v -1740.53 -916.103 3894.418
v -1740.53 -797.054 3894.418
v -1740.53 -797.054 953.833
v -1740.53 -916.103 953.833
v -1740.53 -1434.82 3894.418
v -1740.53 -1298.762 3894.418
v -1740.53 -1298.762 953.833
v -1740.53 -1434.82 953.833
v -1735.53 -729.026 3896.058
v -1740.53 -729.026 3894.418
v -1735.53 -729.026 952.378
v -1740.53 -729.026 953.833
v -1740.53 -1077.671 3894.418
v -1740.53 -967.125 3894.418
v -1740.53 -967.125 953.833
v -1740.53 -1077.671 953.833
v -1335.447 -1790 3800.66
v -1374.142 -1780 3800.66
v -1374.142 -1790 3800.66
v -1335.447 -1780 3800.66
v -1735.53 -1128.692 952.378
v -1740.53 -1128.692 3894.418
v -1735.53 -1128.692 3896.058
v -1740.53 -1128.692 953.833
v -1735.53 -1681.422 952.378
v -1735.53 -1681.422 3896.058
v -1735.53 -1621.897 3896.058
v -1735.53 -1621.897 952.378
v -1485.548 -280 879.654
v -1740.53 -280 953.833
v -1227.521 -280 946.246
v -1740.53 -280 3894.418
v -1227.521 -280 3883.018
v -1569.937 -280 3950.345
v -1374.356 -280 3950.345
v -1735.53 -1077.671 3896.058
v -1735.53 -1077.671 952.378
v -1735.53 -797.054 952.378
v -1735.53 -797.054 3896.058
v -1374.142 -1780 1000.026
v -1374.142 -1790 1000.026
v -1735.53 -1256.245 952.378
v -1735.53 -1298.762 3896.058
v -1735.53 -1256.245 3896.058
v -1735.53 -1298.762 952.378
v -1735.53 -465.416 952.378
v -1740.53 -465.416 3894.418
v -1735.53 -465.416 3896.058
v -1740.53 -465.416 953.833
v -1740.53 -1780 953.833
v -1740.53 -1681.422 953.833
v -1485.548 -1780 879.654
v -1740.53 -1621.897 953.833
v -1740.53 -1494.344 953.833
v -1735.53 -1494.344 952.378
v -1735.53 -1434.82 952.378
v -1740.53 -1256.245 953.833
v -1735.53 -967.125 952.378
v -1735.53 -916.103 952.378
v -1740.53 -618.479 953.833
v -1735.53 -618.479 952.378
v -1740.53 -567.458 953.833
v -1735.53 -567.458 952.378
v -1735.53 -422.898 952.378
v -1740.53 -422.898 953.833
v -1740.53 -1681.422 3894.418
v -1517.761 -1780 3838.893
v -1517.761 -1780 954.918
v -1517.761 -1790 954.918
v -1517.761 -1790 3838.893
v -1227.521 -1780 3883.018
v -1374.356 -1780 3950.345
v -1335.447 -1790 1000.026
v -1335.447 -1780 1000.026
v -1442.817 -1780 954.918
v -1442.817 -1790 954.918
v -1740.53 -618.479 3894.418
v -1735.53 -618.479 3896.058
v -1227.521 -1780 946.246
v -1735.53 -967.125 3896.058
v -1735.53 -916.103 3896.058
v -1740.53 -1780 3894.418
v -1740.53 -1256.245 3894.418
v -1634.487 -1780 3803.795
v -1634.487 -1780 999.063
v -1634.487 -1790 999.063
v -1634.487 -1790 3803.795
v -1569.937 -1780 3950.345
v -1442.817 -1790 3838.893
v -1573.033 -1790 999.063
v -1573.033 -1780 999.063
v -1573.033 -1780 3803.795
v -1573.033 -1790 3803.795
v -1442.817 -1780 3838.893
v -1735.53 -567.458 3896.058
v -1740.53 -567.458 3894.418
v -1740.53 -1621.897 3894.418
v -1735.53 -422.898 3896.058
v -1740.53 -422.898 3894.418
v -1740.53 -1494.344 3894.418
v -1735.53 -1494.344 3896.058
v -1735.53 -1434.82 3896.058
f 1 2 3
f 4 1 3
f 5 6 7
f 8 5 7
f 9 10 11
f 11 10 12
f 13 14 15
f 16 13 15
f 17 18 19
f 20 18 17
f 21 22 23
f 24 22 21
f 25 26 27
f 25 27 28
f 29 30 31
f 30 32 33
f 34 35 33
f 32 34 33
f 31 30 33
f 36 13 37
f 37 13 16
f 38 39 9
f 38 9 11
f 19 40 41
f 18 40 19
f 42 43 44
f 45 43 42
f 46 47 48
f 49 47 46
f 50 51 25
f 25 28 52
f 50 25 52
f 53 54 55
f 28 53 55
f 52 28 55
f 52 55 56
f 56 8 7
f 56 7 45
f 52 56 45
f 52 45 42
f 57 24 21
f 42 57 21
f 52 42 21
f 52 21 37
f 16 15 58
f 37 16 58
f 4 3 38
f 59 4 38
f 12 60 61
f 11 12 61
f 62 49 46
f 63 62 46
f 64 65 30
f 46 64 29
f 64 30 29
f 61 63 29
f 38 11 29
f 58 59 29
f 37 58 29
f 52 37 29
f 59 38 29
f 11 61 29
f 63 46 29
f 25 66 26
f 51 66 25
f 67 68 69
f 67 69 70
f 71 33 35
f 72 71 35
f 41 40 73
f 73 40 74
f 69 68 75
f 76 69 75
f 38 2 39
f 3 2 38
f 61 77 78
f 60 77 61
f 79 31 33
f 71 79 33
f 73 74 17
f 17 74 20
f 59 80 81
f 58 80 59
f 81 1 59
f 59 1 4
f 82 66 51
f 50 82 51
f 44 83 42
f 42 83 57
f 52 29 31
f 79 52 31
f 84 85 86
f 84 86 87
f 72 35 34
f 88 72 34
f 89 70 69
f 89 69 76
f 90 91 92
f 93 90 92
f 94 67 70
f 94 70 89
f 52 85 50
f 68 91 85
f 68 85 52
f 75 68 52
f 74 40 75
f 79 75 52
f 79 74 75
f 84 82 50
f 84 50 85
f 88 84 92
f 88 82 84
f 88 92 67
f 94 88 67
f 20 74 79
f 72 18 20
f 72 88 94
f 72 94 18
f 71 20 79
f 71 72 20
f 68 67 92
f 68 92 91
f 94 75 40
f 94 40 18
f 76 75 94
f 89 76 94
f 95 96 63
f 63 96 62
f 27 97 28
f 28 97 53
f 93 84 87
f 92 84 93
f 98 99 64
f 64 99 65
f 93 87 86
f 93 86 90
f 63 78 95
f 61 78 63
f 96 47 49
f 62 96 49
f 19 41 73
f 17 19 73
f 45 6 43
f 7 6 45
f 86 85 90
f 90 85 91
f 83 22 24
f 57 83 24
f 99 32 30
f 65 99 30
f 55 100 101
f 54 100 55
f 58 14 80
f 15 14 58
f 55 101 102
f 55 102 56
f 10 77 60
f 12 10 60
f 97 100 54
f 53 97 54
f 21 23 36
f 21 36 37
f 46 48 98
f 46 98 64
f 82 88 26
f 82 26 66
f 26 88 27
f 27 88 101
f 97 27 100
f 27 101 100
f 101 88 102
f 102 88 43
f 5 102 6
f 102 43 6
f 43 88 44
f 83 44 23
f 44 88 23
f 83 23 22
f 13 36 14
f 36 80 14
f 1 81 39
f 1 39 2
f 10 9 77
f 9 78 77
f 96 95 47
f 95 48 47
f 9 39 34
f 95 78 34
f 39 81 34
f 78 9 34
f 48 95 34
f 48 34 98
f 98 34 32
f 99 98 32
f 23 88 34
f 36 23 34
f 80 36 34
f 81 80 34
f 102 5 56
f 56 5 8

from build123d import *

# Parameters (mm, degrees)
PAD001_DEPTH    = 1500
SKETCH036_W     = 3231.34552
SKETCH036_H     = 42.51773
SKETCH036_W_2   = 3239.849183
SKETCH036_H_2   = 51.021179
SKETCH036_W_3   = 3282.367005
SKETCH036_H_3   = 68.028198
SKETCH036_W_4   = 3273.863343
SKETCH036_H_4   = 51.021302
SKETCH036_W_5   = 3307.877503
SKETCH036_H_5   = 51.021241
SKETCH036_W_6   = 3341.891541
SKETCH036_H_6   = 42.517212
SKETCH036_W_7   = 3333.388123
SKETCH036_H_7   = 59.524658
SKETCH036_W_8   = 3350.395264
SKETCH036_H_8   = 59.524902
POCKET009_DEPTH = 5
SKETCH037_W     = 61.453369
SKETCH037_H     = 2804.732117
SKETCH037_W_2   = 74.944336
SKETCH037_H_2   = 2883.974792
SKETCH037_W_3   = 38.695313
SKETCH037_H_3   = 2800.634216
PAD026_DEPTH    = 10


with BuildPart() as part:
    # Sketch001 → Pad001 (new body)
    with BuildSketch(Plane.XZ):
        Polygon((-1192.529541, 3875.418457), (-1192.529541, 934.833008), (-937.547852, 860.65448), (-679.521484, 927.246033), (-679.521484, 3864.018066), (-826.355956, 3931.345459), (-1021.937194, 3931.345459), align=None)
    extrude(amount=PAD001_DEPTH)

    # Sketch036 (on Face1 of Pad001) → Pocket009 (cut)
    with BuildSketch(Plane(origin=(-1192.529541, 0, 0), x_dir=(0, 0, -1), z_dir=(-1, 0, 0))):
        with Locations((-2447.934174, 164.156662)):
            Rectangle(SKETCH036_W, SKETCH036_H)
        with Locations((-2435.178924, 312.96878)):
            Rectangle(SKETCH036_W_2, SKETCH036_H_2)
        with Locations((-2439.430755, 483.039612)):
            Rectangle(SKETCH036_W_3, SKETCH036_H_3)
        with Locations((-2435.178924, 661.613922)):
            Rectangle(SKETCH036_W_4, SKETCH036_H_4)
        with Locations((-2435.178924, 823.181274)):
            Rectangle(SKETCH036_W_5, SKETCH036_H_5)
        with Locations((-2426.675324, 997.503723)):
            Rectangle(SKETCH036_W_6, SKETCH036_H_6)
        with Locations((-2422.423614, 1184.581909)):
            Rectangle(SKETCH036_W_7, SKETCH036_H_7)
        with Locations((-2396.912964, 1371.659912)):
            Rectangle(SKETCH036_W_8, SKETCH036_H_8)
    extrude(amount=-POCKET009_DEPTH, mode=Mode.SUBTRACT)

    # Sketch037 (on Face10 of Pocket009) → Pad026 (join)
    with BuildSketch(Plane.XZ.offset(1500)):
        with Locations((-1055.759887, 2382.429108)):
            Rectangle(SKETCH037_W, SKETCH037_H)
        with Locations((-932.289185, 2377.905182)):
            Rectangle(SKETCH037_W_2, SKETCH037_H_2)
        with Locations((-806.794433, 2381.343292)):
            Rectangle(SKETCH037_W_3, SKETCH037_H_3)
    extrude(amount=PAD026_DEPTH)


with BuildPart() as part_1:
    # Body001 placement: moved
    add(part.part.moved(Location((-548, -280, 19))))


solid = part_1.part
